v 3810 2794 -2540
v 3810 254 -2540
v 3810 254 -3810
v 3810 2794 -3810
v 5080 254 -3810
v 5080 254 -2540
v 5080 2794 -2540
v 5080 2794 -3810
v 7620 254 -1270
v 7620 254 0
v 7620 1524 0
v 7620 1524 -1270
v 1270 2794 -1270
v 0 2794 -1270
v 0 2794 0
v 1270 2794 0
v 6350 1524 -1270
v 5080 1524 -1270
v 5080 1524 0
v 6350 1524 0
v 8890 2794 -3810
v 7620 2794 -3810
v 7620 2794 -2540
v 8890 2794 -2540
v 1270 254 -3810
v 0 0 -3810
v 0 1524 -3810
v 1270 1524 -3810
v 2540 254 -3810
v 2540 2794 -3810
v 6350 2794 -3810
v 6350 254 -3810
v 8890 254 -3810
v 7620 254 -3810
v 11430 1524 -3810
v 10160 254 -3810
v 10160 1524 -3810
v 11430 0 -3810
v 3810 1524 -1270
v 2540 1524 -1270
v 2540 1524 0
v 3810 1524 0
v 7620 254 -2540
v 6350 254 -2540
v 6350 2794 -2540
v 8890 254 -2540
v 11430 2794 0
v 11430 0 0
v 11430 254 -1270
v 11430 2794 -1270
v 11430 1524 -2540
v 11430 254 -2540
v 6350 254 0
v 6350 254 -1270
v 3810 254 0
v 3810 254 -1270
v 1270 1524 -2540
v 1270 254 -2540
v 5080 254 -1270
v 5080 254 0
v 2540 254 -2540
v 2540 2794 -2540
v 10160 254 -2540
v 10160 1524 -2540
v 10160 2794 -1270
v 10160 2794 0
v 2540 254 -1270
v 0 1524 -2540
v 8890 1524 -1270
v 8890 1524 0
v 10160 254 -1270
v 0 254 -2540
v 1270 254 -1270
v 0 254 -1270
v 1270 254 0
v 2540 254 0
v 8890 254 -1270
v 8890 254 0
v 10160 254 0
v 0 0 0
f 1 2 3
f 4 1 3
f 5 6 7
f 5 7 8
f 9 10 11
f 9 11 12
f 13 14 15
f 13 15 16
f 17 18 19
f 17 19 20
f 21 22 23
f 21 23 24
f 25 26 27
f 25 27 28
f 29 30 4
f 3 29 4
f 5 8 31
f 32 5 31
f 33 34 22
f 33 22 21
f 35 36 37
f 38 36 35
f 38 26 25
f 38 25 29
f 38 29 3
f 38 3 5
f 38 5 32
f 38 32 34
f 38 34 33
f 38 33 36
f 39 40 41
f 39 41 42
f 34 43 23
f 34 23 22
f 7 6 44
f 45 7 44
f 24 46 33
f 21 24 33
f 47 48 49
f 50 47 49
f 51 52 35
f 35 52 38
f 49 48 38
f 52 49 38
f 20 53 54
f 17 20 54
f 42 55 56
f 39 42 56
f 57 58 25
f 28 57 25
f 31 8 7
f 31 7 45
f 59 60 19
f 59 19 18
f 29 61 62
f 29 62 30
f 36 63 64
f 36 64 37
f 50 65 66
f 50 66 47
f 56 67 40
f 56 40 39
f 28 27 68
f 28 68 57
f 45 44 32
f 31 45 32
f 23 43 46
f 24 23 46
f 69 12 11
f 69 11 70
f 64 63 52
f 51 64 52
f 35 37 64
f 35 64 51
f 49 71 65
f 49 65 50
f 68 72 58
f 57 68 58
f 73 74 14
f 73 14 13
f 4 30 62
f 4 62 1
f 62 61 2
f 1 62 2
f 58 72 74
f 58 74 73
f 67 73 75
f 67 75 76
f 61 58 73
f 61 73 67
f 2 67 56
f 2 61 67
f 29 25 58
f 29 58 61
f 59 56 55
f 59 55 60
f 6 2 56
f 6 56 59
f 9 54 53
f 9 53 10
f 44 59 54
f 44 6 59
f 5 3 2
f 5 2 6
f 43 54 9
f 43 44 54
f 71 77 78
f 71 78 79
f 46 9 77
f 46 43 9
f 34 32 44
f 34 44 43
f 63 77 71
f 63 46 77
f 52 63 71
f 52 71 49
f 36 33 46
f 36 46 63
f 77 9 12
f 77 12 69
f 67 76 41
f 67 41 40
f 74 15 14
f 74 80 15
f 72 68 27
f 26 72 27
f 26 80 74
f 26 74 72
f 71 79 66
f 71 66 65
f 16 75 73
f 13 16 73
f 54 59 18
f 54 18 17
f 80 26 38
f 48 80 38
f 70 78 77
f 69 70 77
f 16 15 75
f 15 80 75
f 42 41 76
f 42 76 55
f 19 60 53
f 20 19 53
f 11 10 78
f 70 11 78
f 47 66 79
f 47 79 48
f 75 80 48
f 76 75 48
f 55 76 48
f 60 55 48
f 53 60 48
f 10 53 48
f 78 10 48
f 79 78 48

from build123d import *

# Parameters (mm, degrees)
SKETCH1_W           = 11430
SKETCH1_H           = 3810
BOSS_EXTRUDE2_DEPTH = 254
SKETCH2_W           = 1270
SKETCH2_H           = 1270
BOSS_EXTRUDE6_DEPTH = 1270
SKETCH2_5_W         = 1270
SKETCH2_5_H         = 1270
BOSS_EXTRUDE7_DEPTH = 2540


with BuildPart() as part:
    # Sketch1 → Boss-Extrude2 (new body)
    with BuildSketch(Plane(origin=(0, 0, 0), x_dir=(1, 0, 0), z_dir=(0, 1, 0))):
        with Locations((5715, 1905)):
            Rectangle(SKETCH1_W, SKETCH1_H)
    extrude(amount=BOSS_EXTRUDE2_DEPTH)

    # Sketch2 → Boss-Extrude6 (add)
    with BuildSketch(Plane(origin=(0, 254, 0), x_dir=(1, 0, 0), z_dir=(0, 1, 0))):
        with Locations((635, 3175)):
            Rectangle(SKETCH2_W, SKETCH2_H)
        with Locations((3175, 635)):
            Rectangle(SKETCH2_W, SKETCH2_H)
        with Locations((5715, 635)):
            Rectangle(SKETCH2_W, SKETCH2_H)
        with Locations((8255, 635)):
            Rectangle(SKETCH2_W, SKETCH2_H)
        with Locations((10795, 3175)):
            Rectangle(SKETCH2_W, SKETCH2_H)
    extrude(amount=BOSS_EXTRUDE6_DEPTH)

    # Sketch2<5> → Boss-Extrude7 (add)
    with BuildSketch(Plane(origin=(0, 254, 0), x_dir=(1, 0, 0), z_dir=(0, 1, 0))):
        with Locations((635, 635)):
            Rectangle(SKETCH2_5_W, SKETCH2_5_H)
        with Locations((3175, 3175)):
            Rectangle(SKETCH2_5_W, SKETCH2_5_H)
        with Locations((5715, 3175)):
            Rectangle(SKETCH2_5_W, SKETCH2_5_H)
        with Locations((8255, 3175)):
            Rectangle(SKETCH2_5_W, SKETCH2_5_H)
        with Locations((10795, 635)):
            Rectangle(SKETCH2_5_W, SKETCH2_5_H)
    extrude(amount=BOSS_EXTRUDE7_DEPTH)


solid = part.part
